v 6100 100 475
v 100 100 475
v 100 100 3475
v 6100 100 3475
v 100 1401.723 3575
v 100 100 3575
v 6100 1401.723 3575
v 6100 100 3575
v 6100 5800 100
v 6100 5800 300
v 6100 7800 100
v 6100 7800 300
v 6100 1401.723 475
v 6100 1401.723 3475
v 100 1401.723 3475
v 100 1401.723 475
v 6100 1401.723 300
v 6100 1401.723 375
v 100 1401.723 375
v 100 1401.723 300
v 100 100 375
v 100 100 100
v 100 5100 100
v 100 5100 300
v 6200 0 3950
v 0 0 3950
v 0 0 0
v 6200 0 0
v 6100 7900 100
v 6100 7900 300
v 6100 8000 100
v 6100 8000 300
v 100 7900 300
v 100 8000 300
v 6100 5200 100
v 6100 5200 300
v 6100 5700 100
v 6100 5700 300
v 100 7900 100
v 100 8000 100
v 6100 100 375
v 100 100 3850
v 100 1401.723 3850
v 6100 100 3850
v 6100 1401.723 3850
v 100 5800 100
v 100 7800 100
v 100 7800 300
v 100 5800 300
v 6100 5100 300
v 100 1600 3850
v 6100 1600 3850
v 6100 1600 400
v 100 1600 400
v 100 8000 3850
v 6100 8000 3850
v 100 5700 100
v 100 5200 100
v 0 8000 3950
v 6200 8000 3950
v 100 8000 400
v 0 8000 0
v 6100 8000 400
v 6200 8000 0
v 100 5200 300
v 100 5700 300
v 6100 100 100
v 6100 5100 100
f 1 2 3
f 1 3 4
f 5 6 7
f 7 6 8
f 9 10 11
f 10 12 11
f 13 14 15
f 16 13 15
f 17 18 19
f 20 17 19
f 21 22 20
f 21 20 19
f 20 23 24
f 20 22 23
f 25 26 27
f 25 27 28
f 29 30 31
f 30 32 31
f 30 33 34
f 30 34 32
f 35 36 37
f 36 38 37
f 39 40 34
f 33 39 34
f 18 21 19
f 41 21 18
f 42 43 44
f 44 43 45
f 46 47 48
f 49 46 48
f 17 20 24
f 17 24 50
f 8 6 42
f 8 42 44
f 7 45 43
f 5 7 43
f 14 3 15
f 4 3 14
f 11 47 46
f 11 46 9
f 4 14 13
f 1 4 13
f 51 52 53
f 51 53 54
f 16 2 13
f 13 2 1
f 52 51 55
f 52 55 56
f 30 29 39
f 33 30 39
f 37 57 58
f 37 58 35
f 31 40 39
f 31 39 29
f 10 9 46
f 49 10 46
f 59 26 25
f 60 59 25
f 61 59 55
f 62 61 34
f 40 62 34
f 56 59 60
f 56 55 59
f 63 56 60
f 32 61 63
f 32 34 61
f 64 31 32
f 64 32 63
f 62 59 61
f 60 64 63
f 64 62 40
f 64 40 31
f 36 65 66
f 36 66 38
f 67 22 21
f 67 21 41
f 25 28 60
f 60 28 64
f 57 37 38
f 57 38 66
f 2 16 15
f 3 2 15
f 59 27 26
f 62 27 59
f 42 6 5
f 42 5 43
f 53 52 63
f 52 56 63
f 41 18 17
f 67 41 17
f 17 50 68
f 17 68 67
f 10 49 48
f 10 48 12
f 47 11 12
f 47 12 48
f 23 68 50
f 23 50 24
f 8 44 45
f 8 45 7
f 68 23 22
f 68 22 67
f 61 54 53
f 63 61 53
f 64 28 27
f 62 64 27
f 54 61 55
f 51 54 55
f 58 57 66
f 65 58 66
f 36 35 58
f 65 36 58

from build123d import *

# Parameters (mm, degrees)
SKETCH1_W            = 6200
SKETCH1_H            = 8000
BOSS_EXTRUDE1_DEPTH  = 100
SKETCH2_W            = 6200
SKETCH2_H            = 100
BOSS_EXTRUDE2_DEPTH  = 3850
SKETCH3_W            = 6200
SKETCH3_H            = 8000
BOSS_EXTRUDE3_DEPTH  = 100
SKETCH5_W            = 3750
SKETCH5_H            = 7900
BOSS_EXTRUDE4_DEPTH  = 100
SKETCH6_W            = 3750
SKETCH6_H            = 7900
BOSS_EXTRUDE5_DEPTH  = 100
SKETCH8_W            = 6100
SKETCH8_H            = 198.276900897
BOSS_EXTRUDE7_DEPTH  = 3550
SKETCH9_W            = 6000
SKETCH9_H            = 100
BOSS_EXTRUDE8_DEPTH  = 6400
SKETCH10_W           = 6200
SKETCH10_H           = 100
BOSS_EXTRUDE9_DEPTH  = 1500
SKETCH11_W           = 6200
SKETCH11_H           = 100
BOSS_EXTRUDE11_DEPTH = 300


with BuildPart() as part:
    # Sketch1 → Boss-Extrude1 (new body)
    with BuildSketch(Plane.XY):
        with Locations((3100, 4000)):
            Rectangle(SKETCH1_W, SKETCH1_H)
    extrude(amount=BOSS_EXTRUDE1_DEPTH)

    # Sketch2 → Boss-Extrude2 (add)
    with BuildSketch(Plane.XY.offset(100)):
        with Locations((3100, 50)):
            Rectangle(SKETCH2_W, SKETCH2_H)
    extrude(amount=BOSS_EXTRUDE2_DEPTH)

    # Sketch3 → Boss-Extrude3 (add)
    with BuildSketch(Plane.XY.offset(3950)):
        with Locations((3100, 4000)):
            Rectangle(SKETCH3_W, SKETCH3_H)
    extrude(amount=-BOSS_EXTRUDE3_DEPTH)

    # Sketch5 → Boss-Extrude4 (add)
    with BuildSketch(Plane(origin=(6200, 0, 0), x_dir=(0, 0, -1), z_dir=(1, 0, 0))):
        with Locations((-1975, 4050)):
            Rectangle(SKETCH5_W, SKETCH5_H)
    extrude(amount=-BOSS_EXTRUDE4_DEPTH)

    # Sketch6 → Boss-Extrude5 (add)
    with BuildSketch(Plane.ZY):
        with Locations((1975, 4050)):
            Rectangle(SKETCH6_W, SKETCH6_H)
    extrude(amount=-BOSS_EXTRUDE5_DEPTH)

    # Sketch8 → Boss-Extrude7 (add)
    with BuildSketch(Plane(origin=(0, 0, 3850), x_dir=(-1, 0, 0), z_dir=(0, 0, -1))):
        with Locations((-3050, 1500.861549552)):
            Rectangle(SKETCH8_W, SKETCH8_H)
    extrude(amount=BOSS_EXTRUDE7_DEPTH)

    # Sketch9 → Boss-Extrude8 (add)
    with BuildSketch(Plane(origin=(0, 1600, 0), x_dir=(1, 0, 0), z_dir=(0, 1, 0))):
        with Locations((3100, -350)):
            Rectangle(SKETCH9_W, SKETCH9_H)
    extrude(amount=BOSS_EXTRUDE8_DEPTH)

    # Sketch10 → Boss-Extrude9 (add)
    with BuildSketch(Plane.XZ):
        with Locations((3100, 3525)):
            Rectangle(SKETCH10_W, SKETCH10_H)
        with Locations((3100, 425)):
            Rectangle(SKETCH10_W, SKETCH10_H)
    extrude(amount=-BOSS_EXTRUDE9_DEPTH)

    # Sketch11 → Boss-Extrude11 (add)
    with BuildSketch(Plane(origin=(0, 0, 0), x_dir=(-1, 0, 0), z_dir=(0, 0, -1))):
        with Locations((-3100, 7850)):
            Rectangle(SKETCH11_W, SKETCH11_H)
        with Locations((-3100, 5750)):
            Rectangle(SKETCH11_W, SKETCH11_H)
        with Locations((-3100, 5150)):
            Rectangle(SKETCH11_W, SKETCH11_H)
    extrude(amount=-BOSS_EXTRUDE11_DEPTH)


solid = part.part
